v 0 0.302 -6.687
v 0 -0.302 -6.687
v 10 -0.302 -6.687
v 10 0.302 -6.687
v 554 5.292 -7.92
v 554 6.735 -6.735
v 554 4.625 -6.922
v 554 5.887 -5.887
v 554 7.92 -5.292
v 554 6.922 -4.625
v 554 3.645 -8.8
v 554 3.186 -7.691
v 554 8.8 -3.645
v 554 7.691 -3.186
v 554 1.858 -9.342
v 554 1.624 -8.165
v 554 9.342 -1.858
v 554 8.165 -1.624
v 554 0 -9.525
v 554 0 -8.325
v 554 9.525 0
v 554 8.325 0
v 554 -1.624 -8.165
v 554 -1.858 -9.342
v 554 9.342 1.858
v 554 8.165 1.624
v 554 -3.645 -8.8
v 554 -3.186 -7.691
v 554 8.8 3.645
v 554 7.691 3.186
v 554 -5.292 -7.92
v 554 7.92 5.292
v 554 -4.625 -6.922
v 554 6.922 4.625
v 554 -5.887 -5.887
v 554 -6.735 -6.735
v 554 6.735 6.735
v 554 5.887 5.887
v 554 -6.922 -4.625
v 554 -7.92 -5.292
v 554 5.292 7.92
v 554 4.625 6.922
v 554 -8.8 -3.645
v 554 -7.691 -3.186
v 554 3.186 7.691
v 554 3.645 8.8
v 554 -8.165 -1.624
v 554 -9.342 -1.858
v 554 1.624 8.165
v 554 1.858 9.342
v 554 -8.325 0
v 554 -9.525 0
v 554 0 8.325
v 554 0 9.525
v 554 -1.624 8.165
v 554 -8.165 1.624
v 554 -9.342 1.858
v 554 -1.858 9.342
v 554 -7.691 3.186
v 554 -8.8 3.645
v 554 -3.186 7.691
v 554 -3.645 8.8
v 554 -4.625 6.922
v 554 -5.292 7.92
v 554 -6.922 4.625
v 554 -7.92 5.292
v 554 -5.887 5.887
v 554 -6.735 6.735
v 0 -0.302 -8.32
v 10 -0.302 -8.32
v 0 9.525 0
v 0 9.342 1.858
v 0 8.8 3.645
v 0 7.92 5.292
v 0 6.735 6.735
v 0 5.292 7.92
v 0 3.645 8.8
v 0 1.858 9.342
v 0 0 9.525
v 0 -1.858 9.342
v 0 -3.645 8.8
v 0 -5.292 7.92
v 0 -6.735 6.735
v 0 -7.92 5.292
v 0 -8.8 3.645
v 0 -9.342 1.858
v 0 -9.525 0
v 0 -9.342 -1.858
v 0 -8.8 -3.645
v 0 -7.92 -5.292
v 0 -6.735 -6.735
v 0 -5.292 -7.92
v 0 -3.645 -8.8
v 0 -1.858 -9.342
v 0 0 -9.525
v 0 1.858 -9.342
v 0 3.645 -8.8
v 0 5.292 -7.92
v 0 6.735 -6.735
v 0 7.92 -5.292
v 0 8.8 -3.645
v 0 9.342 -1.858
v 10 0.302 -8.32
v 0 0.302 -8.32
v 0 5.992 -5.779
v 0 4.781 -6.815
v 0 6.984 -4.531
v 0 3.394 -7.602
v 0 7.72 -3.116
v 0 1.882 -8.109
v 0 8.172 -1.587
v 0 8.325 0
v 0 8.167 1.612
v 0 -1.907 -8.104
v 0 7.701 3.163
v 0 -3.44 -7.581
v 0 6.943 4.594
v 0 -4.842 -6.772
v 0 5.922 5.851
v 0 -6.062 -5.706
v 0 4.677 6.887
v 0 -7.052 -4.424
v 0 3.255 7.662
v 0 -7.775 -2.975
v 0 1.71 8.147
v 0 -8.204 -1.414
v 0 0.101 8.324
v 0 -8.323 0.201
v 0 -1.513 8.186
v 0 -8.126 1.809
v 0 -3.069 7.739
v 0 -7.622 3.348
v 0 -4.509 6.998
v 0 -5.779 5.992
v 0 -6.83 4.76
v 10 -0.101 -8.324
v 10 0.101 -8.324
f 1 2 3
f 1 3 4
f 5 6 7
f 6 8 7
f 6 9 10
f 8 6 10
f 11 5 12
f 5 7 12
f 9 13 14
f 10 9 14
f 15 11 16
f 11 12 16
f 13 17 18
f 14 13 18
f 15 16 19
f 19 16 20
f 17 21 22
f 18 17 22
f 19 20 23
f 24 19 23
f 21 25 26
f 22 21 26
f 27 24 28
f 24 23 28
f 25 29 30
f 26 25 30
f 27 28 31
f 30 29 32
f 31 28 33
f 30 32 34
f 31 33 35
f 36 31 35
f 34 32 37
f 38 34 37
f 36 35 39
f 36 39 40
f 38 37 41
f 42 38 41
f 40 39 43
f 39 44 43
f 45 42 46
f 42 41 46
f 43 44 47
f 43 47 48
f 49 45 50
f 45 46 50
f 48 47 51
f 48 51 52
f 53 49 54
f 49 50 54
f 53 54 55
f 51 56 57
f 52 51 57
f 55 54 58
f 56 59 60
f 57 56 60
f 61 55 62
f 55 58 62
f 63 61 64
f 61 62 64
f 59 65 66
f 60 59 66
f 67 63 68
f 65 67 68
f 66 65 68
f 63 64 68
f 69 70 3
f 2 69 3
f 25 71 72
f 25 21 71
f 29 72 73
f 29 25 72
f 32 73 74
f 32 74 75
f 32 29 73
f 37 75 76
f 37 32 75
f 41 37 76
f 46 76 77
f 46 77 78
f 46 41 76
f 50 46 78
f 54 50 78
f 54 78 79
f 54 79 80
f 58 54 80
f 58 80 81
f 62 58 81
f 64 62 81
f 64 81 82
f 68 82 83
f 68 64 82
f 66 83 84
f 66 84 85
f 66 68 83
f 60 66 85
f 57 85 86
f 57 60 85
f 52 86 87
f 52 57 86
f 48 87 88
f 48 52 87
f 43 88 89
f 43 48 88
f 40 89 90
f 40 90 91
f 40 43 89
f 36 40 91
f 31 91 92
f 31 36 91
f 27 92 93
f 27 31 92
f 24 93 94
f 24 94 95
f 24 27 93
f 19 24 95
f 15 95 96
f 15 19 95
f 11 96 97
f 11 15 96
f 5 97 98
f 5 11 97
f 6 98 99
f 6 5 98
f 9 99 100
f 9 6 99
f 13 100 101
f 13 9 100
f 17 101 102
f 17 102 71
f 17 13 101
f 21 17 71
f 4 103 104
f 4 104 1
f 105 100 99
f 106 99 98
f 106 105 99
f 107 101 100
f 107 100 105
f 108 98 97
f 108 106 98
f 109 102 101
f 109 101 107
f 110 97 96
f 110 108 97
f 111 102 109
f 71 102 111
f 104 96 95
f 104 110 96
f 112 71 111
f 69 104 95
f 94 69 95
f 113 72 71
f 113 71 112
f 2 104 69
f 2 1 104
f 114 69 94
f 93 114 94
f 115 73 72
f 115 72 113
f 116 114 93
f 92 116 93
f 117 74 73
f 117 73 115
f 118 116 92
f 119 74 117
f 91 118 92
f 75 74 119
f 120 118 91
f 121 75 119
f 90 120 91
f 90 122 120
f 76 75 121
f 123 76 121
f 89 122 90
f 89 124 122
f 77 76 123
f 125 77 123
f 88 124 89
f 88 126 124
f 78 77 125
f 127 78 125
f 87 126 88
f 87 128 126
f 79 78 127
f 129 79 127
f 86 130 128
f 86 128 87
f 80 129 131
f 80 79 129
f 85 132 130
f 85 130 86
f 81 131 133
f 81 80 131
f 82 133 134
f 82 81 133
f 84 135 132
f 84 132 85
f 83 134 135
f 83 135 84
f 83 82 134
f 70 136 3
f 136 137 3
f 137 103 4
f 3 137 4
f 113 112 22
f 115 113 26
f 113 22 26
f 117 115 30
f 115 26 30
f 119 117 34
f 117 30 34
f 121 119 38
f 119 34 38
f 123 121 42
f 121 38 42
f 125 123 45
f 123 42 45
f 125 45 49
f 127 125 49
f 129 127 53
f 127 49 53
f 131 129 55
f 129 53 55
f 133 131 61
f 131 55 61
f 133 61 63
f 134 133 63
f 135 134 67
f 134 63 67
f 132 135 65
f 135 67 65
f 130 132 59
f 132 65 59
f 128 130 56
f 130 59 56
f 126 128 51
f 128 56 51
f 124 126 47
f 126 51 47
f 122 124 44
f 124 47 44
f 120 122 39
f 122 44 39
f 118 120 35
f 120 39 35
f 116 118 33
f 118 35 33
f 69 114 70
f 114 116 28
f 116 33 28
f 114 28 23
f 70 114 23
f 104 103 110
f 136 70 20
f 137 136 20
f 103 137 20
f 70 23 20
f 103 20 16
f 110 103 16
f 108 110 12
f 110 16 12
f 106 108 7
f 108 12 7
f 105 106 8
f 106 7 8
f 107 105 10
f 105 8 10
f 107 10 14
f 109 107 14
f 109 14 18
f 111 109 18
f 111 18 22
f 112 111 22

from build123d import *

# Parameters (mm, degrees)
SKIZZE1_W                       = 554
SKIZZE1_H                       = 1.2
SKIZZE2_W                       = 2
SKIZZE2_H                       = 0.603863108
AUFSATZ_LINEAR_AUSTRAGEN1_DEPTH = 10


with BuildPart() as part:
    # Skizze1 → Rotation1 (revolve)
    with BuildSketch(Plane.XY):
        with Locations((277, 8.925)):
            Rectangle(SKIZZE1_W, SKIZZE1_H)
    revolve(axis=Axis((0, 0, 0), (1, 0, 0)))

    # Skizze2 → Aufsatz-Linear austragen1 (add)
    with BuildSketch(Plane.ZY):
        with Locations((-7.687386884, 0)):
            Rectangle(SKIZZE2_W, SKIZZE2_H)
    extrude(amount=-AUFSATZ_LINEAR_AUSTRAGEN1_DEPTH)


solid = part.part
